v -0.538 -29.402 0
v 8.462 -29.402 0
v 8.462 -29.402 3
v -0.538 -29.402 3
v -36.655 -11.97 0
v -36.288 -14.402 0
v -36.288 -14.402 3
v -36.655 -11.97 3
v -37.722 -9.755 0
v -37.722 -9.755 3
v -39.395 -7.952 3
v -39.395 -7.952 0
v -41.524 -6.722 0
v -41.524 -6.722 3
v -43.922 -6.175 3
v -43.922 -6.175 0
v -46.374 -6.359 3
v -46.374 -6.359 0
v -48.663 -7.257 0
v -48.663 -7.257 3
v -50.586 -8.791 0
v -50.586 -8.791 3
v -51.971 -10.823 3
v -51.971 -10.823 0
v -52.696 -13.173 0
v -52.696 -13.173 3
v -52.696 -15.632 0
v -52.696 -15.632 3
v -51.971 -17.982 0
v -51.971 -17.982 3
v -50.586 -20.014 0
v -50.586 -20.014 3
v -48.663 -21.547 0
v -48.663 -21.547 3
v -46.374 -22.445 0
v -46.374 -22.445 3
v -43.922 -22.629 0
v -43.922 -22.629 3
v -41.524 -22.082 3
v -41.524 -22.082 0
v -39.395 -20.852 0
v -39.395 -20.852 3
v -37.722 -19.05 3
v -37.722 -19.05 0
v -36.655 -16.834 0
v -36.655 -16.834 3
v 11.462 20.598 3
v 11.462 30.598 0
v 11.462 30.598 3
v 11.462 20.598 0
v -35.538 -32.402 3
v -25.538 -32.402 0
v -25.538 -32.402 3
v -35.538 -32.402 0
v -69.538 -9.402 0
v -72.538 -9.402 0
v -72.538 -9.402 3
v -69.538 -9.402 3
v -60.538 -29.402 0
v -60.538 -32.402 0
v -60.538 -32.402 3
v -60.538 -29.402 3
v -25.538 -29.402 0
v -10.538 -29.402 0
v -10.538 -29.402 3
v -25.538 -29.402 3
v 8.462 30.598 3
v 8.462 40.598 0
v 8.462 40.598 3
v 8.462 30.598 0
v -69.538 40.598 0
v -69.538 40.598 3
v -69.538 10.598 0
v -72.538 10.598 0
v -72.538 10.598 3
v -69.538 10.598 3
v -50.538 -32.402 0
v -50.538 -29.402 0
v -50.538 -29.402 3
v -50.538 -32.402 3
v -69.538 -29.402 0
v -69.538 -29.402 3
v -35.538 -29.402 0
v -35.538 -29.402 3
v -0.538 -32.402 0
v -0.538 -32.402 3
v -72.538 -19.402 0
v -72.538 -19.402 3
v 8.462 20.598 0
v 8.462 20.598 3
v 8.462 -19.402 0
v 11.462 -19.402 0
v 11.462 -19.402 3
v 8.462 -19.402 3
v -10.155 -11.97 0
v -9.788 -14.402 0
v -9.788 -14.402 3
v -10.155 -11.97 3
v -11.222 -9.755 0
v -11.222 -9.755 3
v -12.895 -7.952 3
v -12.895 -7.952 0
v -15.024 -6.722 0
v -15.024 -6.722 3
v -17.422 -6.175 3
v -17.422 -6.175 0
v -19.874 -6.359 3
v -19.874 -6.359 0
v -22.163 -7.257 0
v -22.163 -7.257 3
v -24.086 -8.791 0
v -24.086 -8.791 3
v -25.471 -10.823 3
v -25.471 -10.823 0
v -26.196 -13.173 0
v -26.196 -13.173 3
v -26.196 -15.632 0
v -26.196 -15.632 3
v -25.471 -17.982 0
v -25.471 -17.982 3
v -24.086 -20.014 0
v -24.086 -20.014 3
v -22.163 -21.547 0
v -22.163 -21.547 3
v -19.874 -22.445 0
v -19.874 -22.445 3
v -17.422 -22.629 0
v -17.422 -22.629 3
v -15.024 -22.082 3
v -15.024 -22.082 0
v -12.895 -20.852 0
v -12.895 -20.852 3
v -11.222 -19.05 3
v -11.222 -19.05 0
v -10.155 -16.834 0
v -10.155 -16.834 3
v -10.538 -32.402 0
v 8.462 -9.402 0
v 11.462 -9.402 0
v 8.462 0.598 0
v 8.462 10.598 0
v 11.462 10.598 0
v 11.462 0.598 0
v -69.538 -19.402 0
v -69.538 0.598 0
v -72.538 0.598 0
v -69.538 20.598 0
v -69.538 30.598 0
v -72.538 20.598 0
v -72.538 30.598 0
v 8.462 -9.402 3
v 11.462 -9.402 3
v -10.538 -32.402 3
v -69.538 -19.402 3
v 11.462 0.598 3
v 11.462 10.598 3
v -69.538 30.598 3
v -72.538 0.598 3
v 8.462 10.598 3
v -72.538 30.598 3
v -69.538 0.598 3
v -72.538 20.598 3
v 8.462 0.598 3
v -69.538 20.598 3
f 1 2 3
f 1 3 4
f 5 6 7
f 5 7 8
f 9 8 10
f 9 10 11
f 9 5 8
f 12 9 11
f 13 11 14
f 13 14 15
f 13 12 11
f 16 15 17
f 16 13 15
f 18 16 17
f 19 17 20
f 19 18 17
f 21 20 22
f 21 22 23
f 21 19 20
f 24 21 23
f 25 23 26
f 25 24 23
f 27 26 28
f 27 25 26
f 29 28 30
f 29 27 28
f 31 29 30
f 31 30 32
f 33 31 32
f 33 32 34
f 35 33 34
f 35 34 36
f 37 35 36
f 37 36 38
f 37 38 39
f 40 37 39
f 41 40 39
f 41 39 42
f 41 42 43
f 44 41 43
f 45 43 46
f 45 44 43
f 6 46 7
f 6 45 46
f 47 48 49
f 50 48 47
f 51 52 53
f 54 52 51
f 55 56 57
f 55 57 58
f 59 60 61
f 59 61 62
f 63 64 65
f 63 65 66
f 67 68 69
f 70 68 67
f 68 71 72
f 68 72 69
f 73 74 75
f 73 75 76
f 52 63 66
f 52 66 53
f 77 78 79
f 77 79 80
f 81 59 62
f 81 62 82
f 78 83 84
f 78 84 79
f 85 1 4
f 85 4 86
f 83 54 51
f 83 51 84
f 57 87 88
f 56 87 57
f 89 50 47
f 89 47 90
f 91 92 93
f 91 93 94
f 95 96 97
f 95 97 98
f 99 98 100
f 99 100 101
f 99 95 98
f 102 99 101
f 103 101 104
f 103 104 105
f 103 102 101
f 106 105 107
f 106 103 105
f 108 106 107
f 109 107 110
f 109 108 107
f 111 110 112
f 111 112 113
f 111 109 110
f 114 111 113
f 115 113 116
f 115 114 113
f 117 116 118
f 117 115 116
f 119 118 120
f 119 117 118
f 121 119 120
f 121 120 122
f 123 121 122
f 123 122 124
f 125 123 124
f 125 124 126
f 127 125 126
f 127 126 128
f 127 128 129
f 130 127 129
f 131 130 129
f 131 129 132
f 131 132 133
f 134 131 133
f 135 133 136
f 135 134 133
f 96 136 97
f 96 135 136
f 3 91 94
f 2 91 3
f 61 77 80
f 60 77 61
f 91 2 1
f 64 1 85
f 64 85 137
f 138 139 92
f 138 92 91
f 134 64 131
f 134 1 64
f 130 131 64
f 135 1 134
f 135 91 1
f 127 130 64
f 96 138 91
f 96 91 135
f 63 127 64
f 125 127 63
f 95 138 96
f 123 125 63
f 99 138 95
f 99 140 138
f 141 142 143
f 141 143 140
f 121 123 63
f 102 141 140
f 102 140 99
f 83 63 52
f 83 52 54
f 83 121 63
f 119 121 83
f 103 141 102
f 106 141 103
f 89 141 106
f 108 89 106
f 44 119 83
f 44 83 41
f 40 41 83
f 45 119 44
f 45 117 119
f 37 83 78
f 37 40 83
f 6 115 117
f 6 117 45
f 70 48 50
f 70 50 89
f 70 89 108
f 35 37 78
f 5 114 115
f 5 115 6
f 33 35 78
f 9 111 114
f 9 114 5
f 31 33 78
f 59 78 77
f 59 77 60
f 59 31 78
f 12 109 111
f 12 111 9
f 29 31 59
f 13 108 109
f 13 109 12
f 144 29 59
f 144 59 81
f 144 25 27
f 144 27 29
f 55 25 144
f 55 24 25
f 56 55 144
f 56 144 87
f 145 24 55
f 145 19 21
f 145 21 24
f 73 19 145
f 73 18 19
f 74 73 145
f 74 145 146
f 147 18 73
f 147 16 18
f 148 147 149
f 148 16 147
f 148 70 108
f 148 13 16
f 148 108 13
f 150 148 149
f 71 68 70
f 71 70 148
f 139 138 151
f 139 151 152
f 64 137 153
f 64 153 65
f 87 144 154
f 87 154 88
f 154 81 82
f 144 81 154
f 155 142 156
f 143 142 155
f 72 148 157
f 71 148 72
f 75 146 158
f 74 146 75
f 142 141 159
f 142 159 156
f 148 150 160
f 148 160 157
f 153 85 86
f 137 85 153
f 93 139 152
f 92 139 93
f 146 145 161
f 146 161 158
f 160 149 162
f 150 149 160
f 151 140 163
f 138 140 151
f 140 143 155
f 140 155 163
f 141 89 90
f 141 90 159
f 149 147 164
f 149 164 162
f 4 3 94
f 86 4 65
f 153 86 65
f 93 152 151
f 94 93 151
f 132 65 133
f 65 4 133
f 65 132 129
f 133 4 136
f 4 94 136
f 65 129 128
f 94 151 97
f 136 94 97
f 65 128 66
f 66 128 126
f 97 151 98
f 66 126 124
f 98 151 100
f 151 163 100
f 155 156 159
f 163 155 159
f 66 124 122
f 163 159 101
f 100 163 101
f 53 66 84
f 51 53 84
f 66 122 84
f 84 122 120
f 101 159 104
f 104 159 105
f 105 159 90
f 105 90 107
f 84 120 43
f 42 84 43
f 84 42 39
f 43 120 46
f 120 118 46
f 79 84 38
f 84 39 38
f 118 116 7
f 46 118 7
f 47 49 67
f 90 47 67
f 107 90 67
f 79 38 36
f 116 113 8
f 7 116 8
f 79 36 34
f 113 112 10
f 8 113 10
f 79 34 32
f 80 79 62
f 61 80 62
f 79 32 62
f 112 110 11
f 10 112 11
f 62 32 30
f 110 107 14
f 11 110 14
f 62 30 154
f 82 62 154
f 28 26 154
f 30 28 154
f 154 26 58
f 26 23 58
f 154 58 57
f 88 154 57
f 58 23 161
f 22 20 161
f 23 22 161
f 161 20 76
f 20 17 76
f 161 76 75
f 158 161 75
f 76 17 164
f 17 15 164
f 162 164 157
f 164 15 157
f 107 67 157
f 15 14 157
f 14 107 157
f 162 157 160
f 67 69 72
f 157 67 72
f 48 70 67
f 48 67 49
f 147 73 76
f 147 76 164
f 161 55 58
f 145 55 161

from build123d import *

# Parameters (mm, degrees)
ESQUISSE1_R        = 8.25
BOSS_EXTRU_1_DEPTH = 3


with BuildPart() as part:
    # Esquisse1 → Boss.-Extru.1 (new body)
    with BuildSketch(Plane.XY):
        Polygon((-69.538481563, 40.597826087), (8.461518437, 40.597826087), (8.461518437, 30.597826087), (11.461518437, 30.597826087), (11.461518437, 20.597826087), (8.461518437, 20.597826087), (8.461518437, 10.597826087), (11.461518437, 10.597826087), (11.461518437, 0.597826087), (8.461518437, 0.597826087), (8.461518437, -9.402173913), (11.461518437, -9.402173913), (11.461518437, -19.402173913), (8.461518437, -19.402173913), (8.461518437, -29.402173913), (-0.538481563, -29.402173913), (-0.538481563, -32.402173913), (-10.538481563, -32.402173913), (-10.538481563, -29.402173913), (-25.538481563, -29.402173913), (-25.538481563, -32.402173913), (-35.538481563, -32.402173913), (-35.538481563, -29.402173913), (-50.538481563, -29.402173913), (-50.538481563, -32.402173913), (-60.538481563, -32.402173913), (-60.538481563, -29.402173913), (-69.538481563, -29.402173913), (-69.538481563, -19.402173913), (-72.538481563, -19.402173913), (-72.538481563, -9.402173913), (-69.538481563, -9.402173913), (-69.538481563, 0.597826087), (-72.538481563, 0.597826087), (-72.538481563, 10.597826087), (-69.538481563, 10.597826087), (-69.538481563, 20.597826087), (-72.538481563, 20.597826087), (-72.538481563, 30.597826087), (-69.538481563, 30.597826087), align=None)
        with Locations((-18.038481563, -14.402173913)):
            Circle(ESQUISSE1_R, mode=Mode.SUBTRACT)
        with Locations((-44.538481563, -14.402173913)):
            Circle(ESQUISSE1_R, mode=Mode.SUBTRACT)
    extrude(amount=BOSS_EXTRU_1_DEPTH)


solid = part.part
